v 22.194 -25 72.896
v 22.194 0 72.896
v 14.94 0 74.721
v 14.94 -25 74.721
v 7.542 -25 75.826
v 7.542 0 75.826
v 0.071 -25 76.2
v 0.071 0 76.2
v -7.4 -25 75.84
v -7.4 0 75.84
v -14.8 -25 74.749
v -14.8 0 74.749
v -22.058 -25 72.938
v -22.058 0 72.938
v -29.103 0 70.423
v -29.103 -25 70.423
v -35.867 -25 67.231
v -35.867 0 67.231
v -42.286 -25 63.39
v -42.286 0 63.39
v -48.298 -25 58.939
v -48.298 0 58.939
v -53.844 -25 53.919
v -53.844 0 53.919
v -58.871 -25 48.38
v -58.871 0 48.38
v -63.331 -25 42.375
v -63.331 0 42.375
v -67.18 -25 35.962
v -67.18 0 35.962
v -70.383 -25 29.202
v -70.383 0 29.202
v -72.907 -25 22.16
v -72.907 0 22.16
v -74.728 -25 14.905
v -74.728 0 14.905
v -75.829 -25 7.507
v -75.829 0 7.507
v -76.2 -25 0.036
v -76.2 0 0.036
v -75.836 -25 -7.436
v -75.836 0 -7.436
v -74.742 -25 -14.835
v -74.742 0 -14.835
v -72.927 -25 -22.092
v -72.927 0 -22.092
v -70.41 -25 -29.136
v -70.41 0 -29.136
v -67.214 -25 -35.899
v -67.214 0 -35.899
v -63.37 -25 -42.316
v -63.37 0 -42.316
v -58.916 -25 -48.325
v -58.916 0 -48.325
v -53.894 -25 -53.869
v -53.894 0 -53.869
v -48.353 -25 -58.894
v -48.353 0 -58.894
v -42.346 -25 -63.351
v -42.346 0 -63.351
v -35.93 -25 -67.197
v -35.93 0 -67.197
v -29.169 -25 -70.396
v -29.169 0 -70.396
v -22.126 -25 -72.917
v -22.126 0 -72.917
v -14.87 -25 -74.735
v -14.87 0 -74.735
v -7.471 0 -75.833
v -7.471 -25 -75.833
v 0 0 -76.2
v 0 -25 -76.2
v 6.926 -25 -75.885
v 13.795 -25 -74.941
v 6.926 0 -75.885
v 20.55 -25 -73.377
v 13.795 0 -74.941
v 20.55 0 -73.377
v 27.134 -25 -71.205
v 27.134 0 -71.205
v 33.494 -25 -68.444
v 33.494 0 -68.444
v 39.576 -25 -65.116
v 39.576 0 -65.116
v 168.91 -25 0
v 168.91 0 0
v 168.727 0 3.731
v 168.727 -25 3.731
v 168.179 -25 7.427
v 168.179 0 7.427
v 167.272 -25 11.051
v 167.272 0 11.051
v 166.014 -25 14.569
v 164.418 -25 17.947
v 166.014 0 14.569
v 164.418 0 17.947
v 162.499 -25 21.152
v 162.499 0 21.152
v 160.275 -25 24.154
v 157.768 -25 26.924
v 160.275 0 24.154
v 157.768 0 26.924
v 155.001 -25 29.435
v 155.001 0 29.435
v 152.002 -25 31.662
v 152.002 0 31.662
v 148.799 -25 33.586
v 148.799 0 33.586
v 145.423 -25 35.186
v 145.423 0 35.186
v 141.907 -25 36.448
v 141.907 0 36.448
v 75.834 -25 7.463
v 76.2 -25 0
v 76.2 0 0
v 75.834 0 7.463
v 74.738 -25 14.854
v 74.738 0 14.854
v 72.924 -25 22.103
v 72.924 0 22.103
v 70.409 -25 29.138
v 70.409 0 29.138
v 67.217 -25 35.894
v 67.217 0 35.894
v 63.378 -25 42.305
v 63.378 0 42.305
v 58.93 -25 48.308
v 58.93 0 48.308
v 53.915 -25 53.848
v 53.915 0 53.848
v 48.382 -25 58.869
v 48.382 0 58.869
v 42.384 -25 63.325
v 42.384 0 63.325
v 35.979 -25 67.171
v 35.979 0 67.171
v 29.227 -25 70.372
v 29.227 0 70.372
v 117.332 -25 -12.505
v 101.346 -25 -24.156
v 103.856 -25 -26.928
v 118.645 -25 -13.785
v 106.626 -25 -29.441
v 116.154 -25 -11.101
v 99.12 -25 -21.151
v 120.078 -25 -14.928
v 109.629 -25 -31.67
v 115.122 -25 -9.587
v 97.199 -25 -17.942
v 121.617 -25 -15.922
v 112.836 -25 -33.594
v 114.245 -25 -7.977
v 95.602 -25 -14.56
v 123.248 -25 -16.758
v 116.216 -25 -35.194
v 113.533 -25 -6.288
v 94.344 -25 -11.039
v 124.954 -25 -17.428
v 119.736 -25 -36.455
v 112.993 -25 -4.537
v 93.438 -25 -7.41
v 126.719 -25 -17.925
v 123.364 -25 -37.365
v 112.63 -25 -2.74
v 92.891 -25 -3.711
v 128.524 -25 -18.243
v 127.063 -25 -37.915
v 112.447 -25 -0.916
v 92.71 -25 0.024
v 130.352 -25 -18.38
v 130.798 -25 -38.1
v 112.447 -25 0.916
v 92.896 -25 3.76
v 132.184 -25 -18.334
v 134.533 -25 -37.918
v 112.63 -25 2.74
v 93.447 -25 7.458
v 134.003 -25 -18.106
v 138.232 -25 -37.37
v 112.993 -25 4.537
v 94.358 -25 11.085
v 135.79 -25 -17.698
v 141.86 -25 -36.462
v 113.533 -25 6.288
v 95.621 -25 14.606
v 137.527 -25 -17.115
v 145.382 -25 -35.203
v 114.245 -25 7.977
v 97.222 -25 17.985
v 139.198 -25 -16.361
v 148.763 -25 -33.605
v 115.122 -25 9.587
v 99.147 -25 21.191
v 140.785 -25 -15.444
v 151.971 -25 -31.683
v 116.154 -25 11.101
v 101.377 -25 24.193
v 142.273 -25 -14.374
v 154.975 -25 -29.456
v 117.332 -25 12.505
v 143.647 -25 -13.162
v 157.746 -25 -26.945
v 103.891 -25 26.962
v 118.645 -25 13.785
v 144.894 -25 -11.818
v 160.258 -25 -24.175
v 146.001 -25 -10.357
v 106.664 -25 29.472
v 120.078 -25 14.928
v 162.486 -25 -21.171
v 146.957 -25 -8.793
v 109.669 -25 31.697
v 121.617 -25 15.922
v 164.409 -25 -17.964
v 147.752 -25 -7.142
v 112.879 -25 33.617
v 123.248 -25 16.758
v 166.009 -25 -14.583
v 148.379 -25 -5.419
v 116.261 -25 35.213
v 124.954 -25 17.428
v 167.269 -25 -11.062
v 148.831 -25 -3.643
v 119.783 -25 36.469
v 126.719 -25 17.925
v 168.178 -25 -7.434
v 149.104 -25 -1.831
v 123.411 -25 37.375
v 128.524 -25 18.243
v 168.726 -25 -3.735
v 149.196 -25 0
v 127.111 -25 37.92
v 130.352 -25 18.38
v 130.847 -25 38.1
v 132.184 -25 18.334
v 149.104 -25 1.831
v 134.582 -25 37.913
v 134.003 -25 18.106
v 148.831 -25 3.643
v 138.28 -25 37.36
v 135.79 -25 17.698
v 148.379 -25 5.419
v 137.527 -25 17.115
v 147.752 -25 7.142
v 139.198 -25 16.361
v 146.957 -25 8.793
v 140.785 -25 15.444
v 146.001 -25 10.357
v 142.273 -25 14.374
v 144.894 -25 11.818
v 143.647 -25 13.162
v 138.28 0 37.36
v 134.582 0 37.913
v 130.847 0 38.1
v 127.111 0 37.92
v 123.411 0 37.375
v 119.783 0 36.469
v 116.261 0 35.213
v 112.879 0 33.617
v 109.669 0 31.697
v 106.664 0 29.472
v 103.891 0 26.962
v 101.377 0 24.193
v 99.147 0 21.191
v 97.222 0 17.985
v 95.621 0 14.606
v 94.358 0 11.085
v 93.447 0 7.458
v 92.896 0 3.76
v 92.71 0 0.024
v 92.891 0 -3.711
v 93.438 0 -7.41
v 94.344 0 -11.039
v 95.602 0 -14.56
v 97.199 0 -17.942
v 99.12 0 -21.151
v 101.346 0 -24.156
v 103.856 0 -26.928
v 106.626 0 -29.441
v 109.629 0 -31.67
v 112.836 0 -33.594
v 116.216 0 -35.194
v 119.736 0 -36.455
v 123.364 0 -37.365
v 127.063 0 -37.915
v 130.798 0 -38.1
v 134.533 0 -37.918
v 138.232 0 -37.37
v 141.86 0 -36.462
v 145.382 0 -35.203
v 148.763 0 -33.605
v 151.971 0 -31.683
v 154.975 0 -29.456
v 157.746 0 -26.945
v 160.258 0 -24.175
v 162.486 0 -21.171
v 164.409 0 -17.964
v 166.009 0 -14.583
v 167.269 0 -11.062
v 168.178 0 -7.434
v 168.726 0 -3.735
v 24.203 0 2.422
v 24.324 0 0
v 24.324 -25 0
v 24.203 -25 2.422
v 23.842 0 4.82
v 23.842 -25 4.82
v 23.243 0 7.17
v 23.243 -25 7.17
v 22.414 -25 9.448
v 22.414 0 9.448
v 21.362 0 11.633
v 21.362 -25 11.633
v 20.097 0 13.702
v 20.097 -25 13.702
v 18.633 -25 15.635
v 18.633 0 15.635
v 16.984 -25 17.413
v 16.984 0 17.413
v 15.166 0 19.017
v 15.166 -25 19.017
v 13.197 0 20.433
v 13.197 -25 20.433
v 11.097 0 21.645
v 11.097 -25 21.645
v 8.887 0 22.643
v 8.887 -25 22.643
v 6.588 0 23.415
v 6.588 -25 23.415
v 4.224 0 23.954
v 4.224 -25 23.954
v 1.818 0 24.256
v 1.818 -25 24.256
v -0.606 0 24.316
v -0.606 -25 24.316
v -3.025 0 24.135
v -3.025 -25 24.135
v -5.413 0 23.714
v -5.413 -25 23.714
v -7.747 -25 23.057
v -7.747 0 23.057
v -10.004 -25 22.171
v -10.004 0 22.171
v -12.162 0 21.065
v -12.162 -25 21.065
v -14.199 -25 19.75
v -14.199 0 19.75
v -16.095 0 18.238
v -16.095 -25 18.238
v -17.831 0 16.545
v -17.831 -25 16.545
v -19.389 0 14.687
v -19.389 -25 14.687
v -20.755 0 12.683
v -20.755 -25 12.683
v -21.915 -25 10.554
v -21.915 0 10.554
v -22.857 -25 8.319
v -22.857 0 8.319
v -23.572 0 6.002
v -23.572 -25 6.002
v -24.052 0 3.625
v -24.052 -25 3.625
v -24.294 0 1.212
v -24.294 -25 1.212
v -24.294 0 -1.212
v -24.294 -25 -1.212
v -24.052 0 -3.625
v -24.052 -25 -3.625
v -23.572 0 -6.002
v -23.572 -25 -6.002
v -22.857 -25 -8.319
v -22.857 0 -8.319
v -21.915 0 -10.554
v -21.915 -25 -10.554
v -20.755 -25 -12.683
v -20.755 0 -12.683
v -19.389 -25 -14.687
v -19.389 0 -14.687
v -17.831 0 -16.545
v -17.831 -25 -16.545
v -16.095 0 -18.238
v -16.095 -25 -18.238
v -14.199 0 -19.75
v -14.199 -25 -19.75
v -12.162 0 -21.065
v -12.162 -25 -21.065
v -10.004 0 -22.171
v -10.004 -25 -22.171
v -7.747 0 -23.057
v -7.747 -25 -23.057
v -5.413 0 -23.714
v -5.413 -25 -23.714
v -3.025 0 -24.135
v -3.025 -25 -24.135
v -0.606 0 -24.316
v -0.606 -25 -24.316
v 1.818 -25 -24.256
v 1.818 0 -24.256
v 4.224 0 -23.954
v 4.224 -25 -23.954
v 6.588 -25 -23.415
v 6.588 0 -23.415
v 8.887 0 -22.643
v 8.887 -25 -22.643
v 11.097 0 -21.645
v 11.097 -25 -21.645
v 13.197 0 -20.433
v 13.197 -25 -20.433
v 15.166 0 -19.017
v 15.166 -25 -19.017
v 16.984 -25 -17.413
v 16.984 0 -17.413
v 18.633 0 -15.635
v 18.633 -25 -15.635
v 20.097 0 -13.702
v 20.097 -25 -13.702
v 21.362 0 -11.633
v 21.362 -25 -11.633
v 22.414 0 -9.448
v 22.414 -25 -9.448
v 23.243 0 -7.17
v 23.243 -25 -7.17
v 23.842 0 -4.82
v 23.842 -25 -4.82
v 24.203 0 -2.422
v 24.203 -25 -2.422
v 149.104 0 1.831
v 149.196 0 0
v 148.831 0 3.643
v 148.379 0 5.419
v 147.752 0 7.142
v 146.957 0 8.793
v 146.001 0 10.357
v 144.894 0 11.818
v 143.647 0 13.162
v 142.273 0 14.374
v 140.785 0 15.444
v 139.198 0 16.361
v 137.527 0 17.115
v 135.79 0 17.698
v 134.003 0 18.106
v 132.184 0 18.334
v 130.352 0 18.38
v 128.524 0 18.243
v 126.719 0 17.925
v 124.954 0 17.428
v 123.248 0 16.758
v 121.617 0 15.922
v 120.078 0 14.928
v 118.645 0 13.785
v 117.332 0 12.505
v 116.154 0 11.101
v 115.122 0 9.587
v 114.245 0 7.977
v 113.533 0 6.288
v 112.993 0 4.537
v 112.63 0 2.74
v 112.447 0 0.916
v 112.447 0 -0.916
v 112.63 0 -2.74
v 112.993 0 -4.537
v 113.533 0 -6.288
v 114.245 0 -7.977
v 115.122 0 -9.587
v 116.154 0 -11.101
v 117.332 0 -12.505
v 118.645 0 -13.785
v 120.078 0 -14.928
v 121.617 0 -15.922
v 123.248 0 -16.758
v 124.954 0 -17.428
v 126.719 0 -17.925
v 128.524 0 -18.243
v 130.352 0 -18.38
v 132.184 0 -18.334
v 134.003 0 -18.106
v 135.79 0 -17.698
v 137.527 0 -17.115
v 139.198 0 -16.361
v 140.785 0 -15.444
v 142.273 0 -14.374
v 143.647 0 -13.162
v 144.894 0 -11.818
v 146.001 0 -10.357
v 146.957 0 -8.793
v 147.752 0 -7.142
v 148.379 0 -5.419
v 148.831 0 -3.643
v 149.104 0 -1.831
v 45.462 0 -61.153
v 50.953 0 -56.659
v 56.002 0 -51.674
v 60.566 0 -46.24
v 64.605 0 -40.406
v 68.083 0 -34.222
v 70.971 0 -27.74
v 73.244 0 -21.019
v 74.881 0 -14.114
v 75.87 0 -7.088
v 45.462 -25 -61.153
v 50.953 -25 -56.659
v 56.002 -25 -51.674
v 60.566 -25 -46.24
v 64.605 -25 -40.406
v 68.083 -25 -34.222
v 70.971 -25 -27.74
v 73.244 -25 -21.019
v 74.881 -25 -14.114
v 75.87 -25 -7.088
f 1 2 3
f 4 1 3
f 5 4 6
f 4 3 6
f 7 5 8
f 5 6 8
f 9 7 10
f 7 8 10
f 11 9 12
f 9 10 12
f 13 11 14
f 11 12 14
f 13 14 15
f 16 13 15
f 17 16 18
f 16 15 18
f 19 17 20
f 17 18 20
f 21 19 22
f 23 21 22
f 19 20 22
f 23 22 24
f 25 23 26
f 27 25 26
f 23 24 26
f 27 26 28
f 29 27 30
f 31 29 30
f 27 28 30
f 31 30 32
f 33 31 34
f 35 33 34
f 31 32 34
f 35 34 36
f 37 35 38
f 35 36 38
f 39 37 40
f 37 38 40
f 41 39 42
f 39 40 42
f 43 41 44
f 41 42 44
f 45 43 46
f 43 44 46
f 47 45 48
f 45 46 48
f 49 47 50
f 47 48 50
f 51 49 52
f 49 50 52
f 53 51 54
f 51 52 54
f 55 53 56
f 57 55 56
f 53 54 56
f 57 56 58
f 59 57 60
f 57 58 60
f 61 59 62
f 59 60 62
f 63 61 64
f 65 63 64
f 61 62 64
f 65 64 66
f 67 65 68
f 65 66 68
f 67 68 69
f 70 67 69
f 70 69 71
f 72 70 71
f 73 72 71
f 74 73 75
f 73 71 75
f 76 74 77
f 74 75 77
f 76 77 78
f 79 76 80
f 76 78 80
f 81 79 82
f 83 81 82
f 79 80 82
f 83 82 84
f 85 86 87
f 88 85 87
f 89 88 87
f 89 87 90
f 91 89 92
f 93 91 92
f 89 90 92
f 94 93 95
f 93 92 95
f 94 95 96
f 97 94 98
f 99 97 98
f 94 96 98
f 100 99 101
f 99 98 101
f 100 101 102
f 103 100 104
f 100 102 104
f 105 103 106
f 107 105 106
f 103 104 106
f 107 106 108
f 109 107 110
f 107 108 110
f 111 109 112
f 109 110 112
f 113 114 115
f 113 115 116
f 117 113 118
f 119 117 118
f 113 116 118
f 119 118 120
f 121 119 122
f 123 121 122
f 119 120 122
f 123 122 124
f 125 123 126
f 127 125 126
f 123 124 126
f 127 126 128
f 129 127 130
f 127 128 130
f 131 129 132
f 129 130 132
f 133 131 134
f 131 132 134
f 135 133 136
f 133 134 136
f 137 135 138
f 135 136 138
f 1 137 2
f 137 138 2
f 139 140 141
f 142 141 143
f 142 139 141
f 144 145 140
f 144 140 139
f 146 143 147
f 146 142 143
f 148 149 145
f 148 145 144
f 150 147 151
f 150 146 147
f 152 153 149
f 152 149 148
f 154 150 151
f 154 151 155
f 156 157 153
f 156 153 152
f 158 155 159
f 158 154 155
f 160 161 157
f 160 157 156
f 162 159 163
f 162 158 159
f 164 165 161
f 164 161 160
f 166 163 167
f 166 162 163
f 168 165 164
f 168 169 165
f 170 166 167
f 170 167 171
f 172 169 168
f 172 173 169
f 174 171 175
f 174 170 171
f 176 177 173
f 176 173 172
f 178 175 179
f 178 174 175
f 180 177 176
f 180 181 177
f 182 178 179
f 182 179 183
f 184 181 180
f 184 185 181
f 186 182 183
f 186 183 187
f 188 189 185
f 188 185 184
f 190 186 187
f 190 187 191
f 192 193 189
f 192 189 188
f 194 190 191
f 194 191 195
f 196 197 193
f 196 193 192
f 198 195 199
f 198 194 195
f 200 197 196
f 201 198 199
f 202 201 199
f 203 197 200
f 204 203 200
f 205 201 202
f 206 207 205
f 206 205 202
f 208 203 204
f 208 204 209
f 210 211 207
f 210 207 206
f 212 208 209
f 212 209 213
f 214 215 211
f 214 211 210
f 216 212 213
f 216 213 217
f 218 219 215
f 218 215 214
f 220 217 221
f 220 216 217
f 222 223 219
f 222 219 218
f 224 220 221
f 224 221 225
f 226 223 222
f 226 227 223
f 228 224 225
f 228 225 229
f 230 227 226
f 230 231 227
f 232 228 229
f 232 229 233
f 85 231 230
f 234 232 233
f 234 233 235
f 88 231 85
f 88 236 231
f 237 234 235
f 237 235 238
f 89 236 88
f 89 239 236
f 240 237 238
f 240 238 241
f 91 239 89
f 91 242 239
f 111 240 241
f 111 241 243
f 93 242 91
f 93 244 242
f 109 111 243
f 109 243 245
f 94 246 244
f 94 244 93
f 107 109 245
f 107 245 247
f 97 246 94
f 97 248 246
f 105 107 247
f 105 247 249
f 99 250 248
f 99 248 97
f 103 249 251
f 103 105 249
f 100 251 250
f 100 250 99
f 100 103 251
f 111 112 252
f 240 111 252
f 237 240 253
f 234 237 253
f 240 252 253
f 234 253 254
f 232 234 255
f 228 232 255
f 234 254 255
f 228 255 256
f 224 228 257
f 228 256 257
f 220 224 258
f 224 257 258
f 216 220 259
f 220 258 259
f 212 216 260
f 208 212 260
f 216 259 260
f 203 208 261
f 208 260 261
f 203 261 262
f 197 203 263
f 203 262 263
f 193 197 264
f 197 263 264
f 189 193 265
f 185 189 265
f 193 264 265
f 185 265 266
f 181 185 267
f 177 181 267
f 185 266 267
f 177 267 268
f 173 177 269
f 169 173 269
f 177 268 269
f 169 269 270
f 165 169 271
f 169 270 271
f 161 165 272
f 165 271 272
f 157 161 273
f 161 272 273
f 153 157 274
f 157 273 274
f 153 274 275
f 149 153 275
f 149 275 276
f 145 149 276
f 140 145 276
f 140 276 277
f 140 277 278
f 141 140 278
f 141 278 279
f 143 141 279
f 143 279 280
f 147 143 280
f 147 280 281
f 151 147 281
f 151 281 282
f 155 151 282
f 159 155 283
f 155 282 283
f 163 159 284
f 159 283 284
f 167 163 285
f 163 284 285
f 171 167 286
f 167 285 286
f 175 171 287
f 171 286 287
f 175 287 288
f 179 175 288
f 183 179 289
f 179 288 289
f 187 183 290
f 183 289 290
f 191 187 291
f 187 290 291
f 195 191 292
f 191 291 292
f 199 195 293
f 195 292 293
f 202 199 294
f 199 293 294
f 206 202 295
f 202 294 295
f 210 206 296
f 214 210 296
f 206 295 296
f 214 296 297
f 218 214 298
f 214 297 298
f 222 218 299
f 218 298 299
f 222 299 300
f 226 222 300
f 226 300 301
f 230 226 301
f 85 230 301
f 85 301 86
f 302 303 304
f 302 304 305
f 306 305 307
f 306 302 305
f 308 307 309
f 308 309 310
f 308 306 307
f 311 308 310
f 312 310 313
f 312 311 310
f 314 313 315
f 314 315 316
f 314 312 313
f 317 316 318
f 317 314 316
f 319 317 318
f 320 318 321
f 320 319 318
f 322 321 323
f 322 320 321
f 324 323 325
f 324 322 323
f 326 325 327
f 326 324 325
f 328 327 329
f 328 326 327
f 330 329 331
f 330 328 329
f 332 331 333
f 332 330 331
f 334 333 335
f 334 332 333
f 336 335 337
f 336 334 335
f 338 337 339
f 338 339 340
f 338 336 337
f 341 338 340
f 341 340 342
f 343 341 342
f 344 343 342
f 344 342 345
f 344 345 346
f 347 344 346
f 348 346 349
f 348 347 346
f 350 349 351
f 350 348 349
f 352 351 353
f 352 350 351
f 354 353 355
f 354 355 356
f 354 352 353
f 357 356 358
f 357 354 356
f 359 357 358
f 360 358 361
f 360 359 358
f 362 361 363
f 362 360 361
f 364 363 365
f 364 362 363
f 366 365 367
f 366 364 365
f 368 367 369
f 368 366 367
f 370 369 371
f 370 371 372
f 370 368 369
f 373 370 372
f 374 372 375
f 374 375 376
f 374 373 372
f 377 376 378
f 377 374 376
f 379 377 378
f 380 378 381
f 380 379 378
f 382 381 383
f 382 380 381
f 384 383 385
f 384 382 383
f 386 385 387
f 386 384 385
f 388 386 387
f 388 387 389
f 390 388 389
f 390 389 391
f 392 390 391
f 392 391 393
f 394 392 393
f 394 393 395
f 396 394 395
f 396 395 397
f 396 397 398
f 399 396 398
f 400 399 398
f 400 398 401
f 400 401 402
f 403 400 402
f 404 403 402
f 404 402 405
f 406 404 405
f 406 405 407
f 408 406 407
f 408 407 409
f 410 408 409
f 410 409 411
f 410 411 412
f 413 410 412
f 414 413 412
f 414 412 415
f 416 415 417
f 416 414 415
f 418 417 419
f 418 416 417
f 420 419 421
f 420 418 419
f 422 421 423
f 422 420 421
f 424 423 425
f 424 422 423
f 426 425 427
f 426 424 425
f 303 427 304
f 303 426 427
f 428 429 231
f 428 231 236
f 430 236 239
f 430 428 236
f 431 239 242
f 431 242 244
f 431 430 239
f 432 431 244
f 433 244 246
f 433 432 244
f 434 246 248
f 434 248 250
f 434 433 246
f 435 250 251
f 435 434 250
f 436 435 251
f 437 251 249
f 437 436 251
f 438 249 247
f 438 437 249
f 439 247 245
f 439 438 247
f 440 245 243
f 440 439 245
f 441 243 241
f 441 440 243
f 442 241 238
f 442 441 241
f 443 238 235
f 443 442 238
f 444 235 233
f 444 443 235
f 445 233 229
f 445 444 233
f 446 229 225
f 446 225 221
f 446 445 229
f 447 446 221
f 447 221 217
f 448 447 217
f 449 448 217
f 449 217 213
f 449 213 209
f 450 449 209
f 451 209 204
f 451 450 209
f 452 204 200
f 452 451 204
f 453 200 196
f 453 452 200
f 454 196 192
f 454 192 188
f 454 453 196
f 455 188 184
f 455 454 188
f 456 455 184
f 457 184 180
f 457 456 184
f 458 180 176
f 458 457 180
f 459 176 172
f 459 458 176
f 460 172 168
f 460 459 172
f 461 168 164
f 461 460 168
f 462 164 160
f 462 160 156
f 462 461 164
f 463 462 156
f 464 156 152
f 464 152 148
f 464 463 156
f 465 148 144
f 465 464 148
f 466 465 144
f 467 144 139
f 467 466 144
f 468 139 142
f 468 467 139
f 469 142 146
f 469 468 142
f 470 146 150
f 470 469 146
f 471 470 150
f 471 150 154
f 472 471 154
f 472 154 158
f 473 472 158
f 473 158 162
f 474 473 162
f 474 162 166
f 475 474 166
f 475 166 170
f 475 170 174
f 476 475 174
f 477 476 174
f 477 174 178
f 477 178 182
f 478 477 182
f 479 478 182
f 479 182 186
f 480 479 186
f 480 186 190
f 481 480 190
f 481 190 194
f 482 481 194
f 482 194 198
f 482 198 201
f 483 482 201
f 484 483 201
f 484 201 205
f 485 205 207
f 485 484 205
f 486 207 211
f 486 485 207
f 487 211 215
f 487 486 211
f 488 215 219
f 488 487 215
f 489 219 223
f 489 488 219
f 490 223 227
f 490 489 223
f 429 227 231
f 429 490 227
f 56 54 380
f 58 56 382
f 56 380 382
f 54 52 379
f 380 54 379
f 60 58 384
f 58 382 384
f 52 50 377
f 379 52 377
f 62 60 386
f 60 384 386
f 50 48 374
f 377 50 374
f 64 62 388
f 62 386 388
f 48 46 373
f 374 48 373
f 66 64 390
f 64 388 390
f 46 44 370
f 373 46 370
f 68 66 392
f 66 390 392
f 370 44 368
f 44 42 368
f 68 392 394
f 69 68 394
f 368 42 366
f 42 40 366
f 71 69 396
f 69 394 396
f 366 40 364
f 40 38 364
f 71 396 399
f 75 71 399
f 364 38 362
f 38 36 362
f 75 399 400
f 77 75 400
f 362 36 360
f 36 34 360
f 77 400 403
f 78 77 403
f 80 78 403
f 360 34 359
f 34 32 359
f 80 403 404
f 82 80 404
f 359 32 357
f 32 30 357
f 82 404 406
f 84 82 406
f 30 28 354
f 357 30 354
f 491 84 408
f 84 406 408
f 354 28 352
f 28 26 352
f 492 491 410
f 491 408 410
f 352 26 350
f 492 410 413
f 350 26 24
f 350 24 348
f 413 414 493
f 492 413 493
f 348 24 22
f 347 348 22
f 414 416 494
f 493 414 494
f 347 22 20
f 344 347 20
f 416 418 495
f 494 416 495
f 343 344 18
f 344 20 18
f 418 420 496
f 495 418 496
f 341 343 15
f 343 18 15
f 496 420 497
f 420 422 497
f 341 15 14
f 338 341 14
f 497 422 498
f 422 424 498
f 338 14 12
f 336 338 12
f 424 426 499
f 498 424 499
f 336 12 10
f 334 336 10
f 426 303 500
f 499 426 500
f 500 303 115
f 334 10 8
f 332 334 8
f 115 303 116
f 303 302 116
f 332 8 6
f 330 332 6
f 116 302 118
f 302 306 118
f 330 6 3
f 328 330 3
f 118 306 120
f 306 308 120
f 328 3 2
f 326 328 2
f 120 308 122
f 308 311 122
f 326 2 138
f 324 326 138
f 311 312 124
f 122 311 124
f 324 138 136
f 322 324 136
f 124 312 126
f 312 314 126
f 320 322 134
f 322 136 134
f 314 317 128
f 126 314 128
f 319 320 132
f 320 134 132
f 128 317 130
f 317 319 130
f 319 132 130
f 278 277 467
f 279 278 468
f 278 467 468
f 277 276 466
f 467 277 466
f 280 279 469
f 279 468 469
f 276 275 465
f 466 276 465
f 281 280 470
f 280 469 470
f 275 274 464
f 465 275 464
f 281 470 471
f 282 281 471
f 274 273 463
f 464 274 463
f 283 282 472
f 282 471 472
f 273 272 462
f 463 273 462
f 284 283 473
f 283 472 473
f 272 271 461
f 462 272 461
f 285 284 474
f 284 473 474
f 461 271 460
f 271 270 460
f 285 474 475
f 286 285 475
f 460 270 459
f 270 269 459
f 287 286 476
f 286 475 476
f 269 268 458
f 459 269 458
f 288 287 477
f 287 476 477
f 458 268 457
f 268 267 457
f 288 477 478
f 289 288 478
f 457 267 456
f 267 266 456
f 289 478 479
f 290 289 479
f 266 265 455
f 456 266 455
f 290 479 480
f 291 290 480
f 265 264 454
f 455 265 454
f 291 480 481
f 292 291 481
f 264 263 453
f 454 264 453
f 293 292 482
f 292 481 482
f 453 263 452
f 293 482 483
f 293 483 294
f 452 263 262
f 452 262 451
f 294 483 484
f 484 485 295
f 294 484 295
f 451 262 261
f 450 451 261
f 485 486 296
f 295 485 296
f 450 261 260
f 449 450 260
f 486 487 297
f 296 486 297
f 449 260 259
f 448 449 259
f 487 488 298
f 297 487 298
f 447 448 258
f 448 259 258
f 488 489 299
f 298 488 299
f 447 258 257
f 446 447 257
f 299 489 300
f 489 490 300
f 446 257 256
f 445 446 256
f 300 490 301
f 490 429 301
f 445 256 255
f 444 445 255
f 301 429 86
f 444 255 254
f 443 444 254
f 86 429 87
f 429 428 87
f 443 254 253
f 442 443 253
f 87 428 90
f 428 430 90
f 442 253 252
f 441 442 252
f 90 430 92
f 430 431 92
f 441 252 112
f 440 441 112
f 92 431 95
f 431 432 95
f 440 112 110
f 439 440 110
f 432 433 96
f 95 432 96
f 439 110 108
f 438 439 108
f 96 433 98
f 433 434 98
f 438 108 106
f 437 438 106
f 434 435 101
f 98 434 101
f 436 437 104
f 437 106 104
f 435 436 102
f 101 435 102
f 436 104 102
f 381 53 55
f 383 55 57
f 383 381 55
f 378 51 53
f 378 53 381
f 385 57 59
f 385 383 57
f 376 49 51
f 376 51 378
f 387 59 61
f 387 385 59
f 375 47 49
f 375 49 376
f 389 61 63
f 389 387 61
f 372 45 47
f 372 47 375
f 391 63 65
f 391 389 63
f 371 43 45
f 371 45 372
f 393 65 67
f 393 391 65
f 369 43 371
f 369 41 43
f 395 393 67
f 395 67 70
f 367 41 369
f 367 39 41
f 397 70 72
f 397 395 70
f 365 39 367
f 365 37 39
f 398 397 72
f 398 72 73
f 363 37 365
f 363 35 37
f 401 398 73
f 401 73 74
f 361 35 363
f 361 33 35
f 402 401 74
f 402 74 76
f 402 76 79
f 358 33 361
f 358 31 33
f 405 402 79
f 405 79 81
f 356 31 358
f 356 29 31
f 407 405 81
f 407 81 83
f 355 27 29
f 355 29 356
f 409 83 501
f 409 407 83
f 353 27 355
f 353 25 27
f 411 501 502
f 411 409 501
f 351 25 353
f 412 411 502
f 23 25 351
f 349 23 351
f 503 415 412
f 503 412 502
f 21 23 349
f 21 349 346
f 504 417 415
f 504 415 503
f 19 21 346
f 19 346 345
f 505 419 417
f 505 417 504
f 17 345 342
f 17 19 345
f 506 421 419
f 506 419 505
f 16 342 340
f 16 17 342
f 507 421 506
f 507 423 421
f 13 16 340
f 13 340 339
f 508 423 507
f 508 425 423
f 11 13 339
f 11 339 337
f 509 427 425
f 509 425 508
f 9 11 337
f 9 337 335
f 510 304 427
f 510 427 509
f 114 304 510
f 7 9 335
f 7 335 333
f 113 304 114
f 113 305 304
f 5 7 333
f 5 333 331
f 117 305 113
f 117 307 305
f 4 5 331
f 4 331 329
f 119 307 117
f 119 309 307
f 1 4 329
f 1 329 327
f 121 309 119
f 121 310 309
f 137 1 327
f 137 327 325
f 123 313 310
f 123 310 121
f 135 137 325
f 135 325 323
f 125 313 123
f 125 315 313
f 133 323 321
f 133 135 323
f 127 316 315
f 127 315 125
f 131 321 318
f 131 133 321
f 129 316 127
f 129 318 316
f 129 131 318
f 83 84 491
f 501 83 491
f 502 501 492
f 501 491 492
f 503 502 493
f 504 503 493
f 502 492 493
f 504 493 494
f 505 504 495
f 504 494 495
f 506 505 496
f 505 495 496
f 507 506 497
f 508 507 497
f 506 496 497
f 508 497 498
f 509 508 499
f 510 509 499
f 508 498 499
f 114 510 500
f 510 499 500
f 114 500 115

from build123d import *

# Parameters (mm, degrees)
F0_R     = 24.323969
F0_R_2   = 18.385509
F1_DEPTH = 25


with BuildPart() as f1:
    # F0 (on Front) → F1 (new body)
    with BuildSketch(Plane.XZ):
        with BuildLine():
            ThreePointArc((39.57646, -65.116387), (66.415985, -37.354476), (76.2, 0))
            ThreePointArc((76.2, 0), (61.227592, 45.361018), (22.194175, 72.896218))
            ThreePointArc((22.194175, 72.896218), (-75.369529, 11.219362), (0, -76.2))
            Line((0, -76.2), (39.57646, -65.116387))
        make_face()
        Circle(F0_R, mode=Mode.SUBTRACT)
        with BuildLine():
            ThreePointArc((168.91, 0), (161.423796, 22.680509), (141.907087, 36.448109))
            ThreePointArc((141.907087, 36.448109), (100.196204, -22.680509), (168.91, 0))
        make_face()
        with Locations((130.81, 0)):
            Circle(F0_R_2, mode=Mode.SUBTRACT)
        with BuildLine():
            ThreePointArc((0, -76.2), (20.54959, -73.376797), (39.57646, -65.116387))
            Line((39.57646, -65.116387), (0, -76.2))
        make_face()
    extrude(amount=F1_DEPTH)


solid = f1.part
